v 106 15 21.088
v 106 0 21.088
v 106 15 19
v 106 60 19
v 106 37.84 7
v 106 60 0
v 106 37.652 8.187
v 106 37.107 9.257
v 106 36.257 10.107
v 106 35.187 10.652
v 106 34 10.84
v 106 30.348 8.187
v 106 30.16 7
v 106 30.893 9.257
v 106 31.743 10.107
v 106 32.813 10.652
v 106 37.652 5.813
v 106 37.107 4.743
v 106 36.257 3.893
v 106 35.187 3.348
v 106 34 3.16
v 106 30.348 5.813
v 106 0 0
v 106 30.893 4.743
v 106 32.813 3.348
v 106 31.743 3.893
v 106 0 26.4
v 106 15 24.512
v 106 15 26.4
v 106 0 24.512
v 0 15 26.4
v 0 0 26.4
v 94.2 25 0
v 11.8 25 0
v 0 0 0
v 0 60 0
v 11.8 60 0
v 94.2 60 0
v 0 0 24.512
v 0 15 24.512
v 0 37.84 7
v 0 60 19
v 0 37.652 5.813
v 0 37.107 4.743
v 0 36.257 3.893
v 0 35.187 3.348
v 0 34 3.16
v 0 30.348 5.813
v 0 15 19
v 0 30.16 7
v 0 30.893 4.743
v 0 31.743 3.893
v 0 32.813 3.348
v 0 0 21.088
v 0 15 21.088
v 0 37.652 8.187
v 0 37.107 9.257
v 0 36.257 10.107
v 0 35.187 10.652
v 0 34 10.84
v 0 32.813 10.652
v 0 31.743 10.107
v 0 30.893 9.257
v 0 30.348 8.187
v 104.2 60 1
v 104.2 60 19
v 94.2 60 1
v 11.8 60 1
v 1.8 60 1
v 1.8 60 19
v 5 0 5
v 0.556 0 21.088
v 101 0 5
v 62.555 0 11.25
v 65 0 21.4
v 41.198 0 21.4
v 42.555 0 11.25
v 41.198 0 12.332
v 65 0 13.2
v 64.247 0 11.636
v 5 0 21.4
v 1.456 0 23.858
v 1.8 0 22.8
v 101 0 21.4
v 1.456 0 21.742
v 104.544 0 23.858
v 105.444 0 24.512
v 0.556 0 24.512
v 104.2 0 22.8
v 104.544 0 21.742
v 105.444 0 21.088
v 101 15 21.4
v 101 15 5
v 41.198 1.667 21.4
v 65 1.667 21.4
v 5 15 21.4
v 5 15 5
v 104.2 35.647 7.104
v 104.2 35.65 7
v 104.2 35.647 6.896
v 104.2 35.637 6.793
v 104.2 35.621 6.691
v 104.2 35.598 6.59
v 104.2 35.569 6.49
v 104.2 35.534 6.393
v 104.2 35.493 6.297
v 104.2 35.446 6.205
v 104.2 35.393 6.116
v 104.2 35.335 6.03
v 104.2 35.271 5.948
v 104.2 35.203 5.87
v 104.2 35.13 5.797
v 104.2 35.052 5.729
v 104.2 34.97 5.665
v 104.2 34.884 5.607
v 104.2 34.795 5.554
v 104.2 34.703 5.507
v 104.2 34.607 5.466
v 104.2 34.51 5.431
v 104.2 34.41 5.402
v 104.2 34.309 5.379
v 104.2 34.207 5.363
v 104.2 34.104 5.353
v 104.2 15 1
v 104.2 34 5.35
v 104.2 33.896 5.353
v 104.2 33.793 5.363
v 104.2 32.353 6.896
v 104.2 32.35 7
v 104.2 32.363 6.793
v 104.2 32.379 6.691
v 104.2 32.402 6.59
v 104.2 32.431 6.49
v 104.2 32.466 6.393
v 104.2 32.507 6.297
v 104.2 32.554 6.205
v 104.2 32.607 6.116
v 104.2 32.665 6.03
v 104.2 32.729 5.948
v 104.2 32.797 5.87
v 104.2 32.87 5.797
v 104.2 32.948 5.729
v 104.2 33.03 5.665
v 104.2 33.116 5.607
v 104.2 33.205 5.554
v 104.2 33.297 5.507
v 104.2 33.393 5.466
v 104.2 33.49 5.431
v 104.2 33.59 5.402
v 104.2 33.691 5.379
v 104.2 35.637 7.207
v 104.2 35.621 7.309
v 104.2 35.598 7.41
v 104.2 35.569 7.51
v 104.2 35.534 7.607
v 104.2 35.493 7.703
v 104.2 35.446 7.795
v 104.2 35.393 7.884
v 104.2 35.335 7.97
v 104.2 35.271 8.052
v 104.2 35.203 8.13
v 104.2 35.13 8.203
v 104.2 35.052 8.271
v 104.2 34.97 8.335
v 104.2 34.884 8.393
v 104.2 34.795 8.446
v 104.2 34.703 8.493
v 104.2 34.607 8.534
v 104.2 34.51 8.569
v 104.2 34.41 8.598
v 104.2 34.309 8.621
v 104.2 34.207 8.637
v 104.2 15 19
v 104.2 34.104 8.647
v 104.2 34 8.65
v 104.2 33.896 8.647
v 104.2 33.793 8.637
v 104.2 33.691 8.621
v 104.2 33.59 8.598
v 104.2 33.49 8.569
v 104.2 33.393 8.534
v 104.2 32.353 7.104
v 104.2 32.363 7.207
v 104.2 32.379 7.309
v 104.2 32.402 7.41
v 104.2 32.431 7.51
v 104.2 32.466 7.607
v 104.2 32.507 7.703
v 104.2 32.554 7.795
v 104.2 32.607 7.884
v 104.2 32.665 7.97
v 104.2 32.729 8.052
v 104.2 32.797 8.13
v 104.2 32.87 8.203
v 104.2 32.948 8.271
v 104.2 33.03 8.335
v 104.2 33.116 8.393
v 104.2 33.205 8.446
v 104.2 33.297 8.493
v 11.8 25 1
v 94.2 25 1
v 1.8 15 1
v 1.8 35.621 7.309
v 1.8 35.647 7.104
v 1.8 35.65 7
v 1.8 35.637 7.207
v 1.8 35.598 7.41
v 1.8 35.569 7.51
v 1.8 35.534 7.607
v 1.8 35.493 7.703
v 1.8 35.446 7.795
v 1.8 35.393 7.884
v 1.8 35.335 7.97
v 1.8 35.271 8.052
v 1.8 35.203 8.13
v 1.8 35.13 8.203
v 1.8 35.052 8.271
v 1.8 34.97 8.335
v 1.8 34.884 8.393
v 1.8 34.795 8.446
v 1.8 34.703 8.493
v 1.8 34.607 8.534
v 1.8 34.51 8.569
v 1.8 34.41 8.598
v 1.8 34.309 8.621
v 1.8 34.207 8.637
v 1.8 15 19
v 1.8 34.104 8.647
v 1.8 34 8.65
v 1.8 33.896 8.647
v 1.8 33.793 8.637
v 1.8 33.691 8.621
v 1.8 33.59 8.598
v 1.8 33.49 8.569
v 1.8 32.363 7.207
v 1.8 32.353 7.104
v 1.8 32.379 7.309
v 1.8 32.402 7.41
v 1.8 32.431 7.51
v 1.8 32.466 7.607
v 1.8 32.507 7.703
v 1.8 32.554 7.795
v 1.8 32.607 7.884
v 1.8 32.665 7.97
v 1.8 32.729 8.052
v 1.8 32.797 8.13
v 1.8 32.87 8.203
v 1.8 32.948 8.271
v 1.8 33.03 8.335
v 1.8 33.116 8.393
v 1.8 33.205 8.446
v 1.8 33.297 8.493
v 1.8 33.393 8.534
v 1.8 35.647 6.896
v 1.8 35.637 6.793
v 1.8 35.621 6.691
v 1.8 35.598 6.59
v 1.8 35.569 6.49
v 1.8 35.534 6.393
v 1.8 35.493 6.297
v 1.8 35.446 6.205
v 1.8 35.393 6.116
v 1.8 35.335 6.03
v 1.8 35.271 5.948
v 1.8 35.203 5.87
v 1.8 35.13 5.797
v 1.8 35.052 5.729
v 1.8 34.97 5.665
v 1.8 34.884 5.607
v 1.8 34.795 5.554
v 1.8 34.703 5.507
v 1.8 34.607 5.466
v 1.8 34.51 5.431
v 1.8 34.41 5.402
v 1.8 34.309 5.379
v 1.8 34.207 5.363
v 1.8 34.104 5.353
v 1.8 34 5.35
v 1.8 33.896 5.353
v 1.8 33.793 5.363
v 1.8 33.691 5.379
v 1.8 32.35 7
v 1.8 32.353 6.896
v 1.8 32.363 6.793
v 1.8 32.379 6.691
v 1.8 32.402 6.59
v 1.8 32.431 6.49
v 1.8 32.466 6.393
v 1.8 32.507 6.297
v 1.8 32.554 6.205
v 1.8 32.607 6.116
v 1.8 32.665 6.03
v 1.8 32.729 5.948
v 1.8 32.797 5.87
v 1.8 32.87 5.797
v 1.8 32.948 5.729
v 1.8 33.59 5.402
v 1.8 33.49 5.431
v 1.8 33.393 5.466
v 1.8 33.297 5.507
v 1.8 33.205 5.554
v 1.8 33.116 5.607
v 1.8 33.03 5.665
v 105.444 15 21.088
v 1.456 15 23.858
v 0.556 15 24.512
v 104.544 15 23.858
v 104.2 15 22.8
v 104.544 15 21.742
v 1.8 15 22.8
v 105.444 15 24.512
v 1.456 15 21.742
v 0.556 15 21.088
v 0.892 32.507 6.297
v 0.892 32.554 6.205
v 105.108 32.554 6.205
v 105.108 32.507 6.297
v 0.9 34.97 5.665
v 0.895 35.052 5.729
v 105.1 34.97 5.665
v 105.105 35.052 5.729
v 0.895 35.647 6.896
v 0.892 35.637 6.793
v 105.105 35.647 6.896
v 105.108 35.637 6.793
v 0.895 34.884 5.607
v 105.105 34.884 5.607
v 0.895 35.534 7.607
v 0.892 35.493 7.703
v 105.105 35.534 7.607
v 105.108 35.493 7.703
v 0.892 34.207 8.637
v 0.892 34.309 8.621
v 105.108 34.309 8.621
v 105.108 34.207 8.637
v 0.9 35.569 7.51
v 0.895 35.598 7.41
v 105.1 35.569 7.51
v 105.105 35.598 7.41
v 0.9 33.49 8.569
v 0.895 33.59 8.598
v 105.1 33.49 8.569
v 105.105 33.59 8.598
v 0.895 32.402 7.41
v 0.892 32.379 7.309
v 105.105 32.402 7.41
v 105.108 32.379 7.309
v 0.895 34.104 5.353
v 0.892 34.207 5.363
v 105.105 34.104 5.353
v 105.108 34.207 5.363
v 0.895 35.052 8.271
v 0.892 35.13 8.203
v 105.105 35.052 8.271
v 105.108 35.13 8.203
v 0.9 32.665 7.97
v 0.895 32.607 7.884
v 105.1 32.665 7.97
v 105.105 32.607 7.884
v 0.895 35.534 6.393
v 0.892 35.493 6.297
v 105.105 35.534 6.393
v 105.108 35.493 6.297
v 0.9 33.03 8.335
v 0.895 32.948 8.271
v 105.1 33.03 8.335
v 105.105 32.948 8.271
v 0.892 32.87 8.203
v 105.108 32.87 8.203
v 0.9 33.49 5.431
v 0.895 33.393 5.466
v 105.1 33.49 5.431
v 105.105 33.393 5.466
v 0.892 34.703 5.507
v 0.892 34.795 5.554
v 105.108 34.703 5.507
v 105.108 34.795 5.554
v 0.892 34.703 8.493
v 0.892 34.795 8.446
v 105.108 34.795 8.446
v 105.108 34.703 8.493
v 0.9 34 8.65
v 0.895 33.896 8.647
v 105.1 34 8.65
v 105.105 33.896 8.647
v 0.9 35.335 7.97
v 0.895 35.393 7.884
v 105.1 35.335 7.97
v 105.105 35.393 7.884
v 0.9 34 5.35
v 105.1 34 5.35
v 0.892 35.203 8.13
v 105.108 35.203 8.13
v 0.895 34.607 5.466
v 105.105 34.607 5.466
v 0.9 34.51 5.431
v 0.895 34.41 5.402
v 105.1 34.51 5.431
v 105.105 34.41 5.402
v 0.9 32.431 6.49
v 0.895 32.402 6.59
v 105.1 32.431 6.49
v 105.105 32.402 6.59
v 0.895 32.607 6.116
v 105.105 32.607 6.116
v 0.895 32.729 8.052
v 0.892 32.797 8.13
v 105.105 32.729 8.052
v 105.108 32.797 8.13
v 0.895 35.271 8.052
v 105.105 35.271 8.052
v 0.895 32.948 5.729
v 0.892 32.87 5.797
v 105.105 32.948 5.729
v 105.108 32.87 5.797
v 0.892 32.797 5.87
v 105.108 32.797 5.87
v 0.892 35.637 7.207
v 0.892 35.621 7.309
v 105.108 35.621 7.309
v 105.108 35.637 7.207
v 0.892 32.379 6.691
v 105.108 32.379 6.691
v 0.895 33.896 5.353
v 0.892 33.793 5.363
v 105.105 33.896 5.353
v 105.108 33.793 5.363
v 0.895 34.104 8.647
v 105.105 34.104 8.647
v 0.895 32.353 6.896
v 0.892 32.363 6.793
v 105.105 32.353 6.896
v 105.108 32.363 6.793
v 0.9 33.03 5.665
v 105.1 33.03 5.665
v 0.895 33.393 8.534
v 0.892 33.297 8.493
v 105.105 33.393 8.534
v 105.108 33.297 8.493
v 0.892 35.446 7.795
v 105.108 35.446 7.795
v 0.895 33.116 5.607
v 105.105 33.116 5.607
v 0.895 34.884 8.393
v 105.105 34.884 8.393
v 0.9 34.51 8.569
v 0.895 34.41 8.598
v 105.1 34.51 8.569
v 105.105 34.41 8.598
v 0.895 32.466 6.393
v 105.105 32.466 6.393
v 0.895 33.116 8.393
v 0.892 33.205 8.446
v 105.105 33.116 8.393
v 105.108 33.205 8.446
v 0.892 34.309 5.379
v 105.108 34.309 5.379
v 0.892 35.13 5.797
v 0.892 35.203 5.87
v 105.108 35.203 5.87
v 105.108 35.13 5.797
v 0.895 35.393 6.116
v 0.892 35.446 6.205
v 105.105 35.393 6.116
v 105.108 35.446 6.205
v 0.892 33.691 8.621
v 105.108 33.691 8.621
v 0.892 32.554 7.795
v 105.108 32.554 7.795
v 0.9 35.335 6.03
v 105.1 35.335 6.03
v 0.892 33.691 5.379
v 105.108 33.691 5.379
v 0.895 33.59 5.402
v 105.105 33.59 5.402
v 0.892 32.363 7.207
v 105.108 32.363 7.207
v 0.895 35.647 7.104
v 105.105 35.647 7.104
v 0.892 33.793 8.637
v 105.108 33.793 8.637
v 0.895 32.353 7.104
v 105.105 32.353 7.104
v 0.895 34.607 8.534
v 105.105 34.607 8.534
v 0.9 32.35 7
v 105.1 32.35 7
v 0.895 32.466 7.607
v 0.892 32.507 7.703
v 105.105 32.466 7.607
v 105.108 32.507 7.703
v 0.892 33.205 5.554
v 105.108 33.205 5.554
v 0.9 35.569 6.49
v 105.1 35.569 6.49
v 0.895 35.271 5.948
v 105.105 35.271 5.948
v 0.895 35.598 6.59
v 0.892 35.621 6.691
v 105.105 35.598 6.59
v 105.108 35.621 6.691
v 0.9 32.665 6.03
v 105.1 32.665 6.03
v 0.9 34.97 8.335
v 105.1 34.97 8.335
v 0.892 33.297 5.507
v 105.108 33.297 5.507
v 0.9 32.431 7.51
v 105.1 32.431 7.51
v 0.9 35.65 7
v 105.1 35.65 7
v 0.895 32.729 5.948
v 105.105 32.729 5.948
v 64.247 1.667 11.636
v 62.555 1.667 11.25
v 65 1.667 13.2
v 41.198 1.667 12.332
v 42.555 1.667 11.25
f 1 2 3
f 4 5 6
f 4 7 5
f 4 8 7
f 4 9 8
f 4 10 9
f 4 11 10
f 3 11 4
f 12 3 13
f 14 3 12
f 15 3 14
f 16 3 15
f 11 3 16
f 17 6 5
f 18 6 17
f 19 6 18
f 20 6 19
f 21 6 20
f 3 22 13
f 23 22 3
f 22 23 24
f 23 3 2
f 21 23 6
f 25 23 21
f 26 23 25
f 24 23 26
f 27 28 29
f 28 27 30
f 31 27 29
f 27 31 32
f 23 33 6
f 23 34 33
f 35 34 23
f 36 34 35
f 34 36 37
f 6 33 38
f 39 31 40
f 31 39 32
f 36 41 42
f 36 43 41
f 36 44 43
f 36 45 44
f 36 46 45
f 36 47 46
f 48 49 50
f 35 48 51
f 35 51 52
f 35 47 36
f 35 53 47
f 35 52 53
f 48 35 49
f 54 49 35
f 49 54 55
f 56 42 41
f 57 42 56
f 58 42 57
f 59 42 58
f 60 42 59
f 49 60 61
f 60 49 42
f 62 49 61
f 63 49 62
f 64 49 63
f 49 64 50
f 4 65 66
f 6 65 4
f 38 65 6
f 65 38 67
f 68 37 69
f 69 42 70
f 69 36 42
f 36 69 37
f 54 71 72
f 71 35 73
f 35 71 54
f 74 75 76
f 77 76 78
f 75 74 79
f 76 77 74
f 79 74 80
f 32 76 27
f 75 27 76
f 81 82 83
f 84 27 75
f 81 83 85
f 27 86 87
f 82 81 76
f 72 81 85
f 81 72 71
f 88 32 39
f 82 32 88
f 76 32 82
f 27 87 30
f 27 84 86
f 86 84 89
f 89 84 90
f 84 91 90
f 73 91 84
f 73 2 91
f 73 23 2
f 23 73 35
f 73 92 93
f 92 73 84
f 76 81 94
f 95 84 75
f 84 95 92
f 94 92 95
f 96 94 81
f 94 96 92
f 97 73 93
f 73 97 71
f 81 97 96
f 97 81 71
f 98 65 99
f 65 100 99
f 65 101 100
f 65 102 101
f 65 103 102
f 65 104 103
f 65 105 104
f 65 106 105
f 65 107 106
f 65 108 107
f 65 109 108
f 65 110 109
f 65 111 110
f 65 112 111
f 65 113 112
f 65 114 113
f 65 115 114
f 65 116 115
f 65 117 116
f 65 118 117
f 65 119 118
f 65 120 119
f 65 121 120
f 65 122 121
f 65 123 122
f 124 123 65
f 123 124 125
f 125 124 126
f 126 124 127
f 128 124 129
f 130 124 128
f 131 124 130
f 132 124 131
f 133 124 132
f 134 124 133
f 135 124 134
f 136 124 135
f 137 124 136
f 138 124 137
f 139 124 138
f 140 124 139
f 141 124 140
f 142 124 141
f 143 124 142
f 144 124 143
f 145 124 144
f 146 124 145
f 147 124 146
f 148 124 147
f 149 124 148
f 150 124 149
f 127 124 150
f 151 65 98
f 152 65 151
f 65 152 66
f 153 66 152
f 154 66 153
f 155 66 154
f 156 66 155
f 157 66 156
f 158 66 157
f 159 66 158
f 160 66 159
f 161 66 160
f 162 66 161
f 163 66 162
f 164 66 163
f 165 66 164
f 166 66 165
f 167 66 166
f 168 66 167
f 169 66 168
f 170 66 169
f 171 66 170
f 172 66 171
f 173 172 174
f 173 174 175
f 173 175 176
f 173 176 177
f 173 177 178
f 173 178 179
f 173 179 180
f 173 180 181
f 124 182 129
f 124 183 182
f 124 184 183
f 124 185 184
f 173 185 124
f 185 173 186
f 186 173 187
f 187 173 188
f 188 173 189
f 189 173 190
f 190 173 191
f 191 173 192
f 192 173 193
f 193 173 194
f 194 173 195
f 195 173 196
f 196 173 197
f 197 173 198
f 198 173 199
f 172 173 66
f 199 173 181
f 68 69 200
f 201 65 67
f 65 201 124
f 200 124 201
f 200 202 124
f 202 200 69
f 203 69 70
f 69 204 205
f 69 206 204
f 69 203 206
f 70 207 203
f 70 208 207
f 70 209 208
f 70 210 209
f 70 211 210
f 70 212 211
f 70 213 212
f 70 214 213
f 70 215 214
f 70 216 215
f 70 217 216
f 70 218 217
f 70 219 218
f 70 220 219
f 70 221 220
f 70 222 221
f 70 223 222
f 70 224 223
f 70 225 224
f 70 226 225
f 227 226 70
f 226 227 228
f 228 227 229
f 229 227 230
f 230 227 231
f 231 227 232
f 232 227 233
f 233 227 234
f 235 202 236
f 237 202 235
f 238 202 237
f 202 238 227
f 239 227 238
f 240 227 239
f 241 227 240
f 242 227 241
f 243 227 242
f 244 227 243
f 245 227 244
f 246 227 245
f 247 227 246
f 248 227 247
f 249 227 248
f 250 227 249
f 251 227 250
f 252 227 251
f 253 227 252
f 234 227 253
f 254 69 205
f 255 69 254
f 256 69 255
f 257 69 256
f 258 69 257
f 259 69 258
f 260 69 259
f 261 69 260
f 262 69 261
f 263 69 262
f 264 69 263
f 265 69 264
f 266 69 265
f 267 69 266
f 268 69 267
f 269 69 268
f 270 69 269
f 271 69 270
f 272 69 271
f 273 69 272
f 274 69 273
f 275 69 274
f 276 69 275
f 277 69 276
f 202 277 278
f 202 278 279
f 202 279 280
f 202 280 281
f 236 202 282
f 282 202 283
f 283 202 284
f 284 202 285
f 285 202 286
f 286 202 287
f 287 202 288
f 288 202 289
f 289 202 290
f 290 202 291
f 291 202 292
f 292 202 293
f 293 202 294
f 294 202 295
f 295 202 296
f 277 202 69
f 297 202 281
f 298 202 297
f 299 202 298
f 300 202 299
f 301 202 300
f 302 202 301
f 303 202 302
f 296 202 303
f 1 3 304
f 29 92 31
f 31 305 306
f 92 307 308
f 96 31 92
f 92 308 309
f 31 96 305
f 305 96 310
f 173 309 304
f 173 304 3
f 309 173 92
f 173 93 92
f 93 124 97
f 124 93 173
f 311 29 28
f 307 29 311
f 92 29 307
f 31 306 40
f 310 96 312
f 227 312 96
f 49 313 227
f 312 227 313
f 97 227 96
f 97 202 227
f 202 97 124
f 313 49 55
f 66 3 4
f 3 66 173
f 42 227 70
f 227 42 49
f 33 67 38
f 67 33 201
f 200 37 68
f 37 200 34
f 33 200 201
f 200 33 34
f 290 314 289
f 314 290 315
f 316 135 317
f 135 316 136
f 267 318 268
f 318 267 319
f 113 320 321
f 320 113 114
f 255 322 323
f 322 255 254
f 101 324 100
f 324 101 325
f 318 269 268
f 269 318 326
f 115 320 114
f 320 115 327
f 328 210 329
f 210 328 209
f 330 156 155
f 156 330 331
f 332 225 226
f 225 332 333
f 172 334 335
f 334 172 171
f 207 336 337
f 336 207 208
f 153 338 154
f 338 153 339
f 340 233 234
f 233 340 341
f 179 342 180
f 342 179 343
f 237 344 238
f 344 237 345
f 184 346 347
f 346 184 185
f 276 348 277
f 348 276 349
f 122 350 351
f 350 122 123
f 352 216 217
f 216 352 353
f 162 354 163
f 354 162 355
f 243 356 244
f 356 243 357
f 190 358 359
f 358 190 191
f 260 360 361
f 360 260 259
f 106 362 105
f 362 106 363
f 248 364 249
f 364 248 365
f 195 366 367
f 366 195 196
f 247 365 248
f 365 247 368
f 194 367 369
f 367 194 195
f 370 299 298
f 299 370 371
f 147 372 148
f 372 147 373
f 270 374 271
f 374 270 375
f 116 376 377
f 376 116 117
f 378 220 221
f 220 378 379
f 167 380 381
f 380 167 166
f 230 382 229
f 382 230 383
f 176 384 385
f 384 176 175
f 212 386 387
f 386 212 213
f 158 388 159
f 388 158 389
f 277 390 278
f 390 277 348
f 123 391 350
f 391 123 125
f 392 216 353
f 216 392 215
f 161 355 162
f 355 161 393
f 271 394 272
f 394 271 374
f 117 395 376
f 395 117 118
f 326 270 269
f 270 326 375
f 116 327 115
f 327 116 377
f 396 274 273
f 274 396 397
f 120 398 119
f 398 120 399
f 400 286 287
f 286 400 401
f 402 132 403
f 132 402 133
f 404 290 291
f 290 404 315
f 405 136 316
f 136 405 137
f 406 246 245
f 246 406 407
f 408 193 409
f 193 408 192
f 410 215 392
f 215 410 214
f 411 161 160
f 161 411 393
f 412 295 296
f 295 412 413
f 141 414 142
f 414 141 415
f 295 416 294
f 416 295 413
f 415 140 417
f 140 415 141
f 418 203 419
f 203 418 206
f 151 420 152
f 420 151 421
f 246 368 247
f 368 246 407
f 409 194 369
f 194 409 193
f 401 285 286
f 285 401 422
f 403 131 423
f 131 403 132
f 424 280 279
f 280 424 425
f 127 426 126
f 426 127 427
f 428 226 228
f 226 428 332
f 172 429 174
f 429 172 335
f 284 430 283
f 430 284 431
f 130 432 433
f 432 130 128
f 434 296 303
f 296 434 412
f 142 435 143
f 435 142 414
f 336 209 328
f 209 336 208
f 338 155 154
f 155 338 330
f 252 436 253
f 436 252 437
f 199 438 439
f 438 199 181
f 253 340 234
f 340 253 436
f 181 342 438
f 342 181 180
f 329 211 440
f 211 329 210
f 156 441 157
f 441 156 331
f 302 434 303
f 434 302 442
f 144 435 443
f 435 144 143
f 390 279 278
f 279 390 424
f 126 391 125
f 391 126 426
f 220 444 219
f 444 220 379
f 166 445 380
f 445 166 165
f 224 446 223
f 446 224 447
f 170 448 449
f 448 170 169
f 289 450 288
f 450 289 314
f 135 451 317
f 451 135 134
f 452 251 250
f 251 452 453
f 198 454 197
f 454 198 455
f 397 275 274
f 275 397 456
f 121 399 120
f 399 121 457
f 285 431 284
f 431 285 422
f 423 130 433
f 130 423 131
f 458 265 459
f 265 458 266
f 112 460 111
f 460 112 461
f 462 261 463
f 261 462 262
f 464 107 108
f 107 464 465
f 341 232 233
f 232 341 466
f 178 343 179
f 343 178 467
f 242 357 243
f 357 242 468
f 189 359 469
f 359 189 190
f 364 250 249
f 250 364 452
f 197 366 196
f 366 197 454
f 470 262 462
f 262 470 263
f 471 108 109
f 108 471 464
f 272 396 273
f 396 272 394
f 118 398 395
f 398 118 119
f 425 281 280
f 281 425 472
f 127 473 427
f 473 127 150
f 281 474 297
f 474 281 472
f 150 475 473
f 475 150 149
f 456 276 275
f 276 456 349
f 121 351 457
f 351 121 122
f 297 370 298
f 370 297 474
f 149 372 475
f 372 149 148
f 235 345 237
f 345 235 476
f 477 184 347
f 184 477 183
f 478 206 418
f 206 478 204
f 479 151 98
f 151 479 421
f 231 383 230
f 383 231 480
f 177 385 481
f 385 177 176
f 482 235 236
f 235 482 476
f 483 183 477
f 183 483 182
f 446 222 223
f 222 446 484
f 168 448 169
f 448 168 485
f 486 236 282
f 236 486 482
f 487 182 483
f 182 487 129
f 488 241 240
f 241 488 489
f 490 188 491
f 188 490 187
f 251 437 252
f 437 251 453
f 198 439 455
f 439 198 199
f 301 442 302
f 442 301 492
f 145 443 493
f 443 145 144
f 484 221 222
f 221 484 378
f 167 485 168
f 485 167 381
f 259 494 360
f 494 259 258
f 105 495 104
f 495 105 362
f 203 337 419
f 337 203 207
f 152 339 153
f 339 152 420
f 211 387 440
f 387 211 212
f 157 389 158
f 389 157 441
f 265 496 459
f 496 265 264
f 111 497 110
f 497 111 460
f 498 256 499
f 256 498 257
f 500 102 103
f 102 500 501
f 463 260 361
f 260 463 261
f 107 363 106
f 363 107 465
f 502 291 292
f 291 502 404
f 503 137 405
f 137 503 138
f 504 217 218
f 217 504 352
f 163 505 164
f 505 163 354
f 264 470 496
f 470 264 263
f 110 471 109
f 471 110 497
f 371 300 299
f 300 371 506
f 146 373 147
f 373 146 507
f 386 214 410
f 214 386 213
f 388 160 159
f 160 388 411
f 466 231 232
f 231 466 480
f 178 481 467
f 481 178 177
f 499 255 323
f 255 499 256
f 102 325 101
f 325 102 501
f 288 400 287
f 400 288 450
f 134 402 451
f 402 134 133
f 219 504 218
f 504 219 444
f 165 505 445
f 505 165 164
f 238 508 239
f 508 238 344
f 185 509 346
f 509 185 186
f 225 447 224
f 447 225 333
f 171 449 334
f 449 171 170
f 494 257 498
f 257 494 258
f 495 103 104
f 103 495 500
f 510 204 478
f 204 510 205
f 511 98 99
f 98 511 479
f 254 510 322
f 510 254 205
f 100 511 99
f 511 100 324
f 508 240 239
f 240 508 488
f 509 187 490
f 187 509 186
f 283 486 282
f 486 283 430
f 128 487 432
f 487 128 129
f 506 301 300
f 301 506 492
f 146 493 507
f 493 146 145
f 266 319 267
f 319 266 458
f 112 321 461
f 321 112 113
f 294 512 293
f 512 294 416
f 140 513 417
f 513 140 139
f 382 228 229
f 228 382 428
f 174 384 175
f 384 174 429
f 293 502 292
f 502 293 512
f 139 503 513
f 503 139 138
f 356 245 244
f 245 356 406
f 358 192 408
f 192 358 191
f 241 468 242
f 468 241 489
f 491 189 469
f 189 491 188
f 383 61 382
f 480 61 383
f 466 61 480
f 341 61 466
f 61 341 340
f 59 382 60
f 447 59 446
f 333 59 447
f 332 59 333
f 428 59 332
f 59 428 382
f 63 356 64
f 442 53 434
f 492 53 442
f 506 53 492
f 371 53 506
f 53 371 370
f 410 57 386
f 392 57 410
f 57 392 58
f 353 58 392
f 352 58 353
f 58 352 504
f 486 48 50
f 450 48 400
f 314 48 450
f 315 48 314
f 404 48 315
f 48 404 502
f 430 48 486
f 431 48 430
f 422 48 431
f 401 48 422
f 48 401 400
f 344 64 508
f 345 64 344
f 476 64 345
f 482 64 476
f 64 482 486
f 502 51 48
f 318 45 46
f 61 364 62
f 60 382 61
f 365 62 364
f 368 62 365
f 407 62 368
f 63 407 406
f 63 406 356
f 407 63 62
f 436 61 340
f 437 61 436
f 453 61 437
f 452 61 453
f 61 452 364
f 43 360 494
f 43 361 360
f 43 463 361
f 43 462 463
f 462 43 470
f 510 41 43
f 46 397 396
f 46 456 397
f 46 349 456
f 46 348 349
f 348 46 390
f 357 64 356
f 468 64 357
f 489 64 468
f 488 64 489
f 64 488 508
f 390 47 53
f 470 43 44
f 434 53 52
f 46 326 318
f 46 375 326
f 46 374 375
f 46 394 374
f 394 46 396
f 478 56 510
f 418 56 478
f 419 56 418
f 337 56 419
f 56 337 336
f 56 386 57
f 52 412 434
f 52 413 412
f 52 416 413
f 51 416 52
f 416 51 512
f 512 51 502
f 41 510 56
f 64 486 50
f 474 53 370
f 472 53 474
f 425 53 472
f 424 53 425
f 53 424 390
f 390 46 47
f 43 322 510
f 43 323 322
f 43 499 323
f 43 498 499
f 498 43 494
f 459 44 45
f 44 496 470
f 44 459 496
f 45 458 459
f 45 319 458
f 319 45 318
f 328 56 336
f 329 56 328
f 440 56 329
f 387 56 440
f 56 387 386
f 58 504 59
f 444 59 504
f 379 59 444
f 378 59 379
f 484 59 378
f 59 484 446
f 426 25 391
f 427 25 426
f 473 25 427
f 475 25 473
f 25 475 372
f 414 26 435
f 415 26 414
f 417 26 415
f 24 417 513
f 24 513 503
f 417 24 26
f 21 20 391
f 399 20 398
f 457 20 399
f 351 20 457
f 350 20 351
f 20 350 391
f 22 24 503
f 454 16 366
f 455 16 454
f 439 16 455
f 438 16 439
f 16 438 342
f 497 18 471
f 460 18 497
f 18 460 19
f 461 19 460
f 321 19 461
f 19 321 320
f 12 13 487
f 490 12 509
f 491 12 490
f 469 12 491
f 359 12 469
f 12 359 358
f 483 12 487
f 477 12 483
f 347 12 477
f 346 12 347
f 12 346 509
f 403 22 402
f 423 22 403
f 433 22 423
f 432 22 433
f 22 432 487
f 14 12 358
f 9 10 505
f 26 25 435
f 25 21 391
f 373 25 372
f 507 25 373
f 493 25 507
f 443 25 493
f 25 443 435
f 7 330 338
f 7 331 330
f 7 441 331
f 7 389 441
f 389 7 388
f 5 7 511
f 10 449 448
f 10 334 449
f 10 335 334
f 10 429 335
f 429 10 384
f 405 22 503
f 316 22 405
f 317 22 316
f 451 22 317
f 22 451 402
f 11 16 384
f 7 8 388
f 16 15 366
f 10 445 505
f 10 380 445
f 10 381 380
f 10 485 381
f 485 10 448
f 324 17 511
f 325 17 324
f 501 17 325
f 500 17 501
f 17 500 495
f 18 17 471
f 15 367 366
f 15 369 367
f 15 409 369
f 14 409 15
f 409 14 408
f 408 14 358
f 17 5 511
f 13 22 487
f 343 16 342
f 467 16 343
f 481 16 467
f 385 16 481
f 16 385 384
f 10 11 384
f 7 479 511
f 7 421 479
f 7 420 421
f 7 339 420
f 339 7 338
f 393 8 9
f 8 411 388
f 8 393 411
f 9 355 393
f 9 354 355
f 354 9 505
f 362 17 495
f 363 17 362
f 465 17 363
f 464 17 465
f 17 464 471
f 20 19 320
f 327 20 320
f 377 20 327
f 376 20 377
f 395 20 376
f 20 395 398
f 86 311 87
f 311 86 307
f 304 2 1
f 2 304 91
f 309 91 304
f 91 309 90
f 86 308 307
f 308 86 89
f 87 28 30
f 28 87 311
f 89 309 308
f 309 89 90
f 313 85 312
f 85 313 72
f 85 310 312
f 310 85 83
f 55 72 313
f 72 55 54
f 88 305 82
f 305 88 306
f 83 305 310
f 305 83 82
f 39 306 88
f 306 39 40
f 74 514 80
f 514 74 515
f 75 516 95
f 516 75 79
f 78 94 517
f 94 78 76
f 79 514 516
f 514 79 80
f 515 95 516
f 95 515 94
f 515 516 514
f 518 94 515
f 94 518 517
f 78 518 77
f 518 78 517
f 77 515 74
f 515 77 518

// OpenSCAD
caddyHeight=26.4;
caddyWidth=106.0;
caddyDepth=60.0;

caddyFrameWidth=5;

bezelThickness=15;
railHeight=19.0;
railThickness=1.8;
shelfThickness=1.0;
shelfWidth=10.0;

mountHoleDepth=19.0;
mountHoleHeight=7.0;
mountHoleDiameter=3.3;
mountHoleChamferDiameter=7.68;

airHoleDiameter=3.0;

pullTabWidth=20;

latchDetentRadius=1.8;
latchDetentHeight=22.8;

difference() {
    //build the caddy
    cube(
        size = [caddyWidth,caddyDepth,caddyHeight]
    ); 
    
    //empty out the caddy to the frame thickness
    translate([caddyFrameWidth,0,caddyFrameWidth]){
        cube(
            size=[
                caddyWidth-(2*caddyFrameWidth),
                caddyDepth,
                caddyHeight-(2*caddyFrameWidth)
            ]
        );
    };
    
    
    //holow out the caddy
    translate([railThickness, bezelThickness, shelfThickness]) {
        cube(
            size=[
                caddyWidth-(railThickness*2),
                (caddyDepth-bezelThickness),
                (caddyHeight-shelfThickness)
                ]
        );
    };
    
    
    //remove the top of the rails
      translate([0,
            bezelThickness,
            railHeight]) {    
        cube(size=[
            caddyWidth,
            caddyDepth-bezelThickness,
            caddyHeight-railHeight
        ]);
    }  

    //remove the floor
    translate([railThickness+shelfWidth, bezelThickness+shelfWidth, 0]) {
        cube(size=[
            caddyWidth-(railThickness*2)-(shelfWidth*2),
            (caddyDepth-bezelThickness-shelfWidth),
            (caddyHeight)
        ]);
    };    
    
    //cut the screw holes
    translate([
        caddyWidth/2,
        bezelThickness + mountHoleDepth,
        mountHoleHeight 
        ]){
        rotate(a=90, v=[0,1,0]) {
            $fn=100; 
            cylinder(
                    center=true,
                    h=caddyWidth,
                    r=mountHoleDiameter/2
                );
        }
    };
    
    //left screw hole bezel
    translate(
    [
       railThickness/4,
       bezelThickness + mountHoleDepth,
       mountHoleHeight 
    ]
    ) {
        rotate(a=-90, v=[0,1,0]) {
            $fn=20; 
            color("red")            
            cylinder(
                center=true,
                h=railThickness/2,
                r1=mountHoleDiameter/2,
                r2=mountHoleChamferDiameter/2
            );
        }
    };
    
    //right screwhole bezel
    translate(
    [
       caddyWidth-railThickness/4,
       bezelThickness + mountHoleDepth,
       mountHoleHeight 
    ]
    ) {
        rotate(a=90, v=[0,1,0]) {
            $fn=20;
            color("red")
            cylinder(
                center=true,
                h=railThickness/2,
                r1=mountHoleDiameter/2,
                r2=mountHoleChamferDiameter/2
            );
        }
    }; 
   
   
   //cut out the latch detents
    translate([caddyWidth,bezelThickness/2,latchDetentHeight]){
    rotate(-90,[1,0,0]){
    $fn=10;
    cylinder(r=latchDetentRadius, h=bezelThickness, center=true);
    }
    }
    translate([0,bezelThickness/2,latchDetentHeight]){
        rotate(-90,[1,0,0]){
        $fn=10;
        cylinder(r=latchDetentRadius, h=bezelThickness, center=true);
        }
    }
    
};
//Add a finger pull tab
translate([
    (caddyWidth/2)-(pullTabWidth/2),
    0,
    caddyHeight/2]) {
    minkowski() {
    cube(
        size=[pullTabWidth,bezelThickness/18,caddyWidth/10]
    );
        rotate(a=-90, v=[1,0,0]) {
            cylinder(r=2, h=bezelThickness/18);
        }
    };
}
